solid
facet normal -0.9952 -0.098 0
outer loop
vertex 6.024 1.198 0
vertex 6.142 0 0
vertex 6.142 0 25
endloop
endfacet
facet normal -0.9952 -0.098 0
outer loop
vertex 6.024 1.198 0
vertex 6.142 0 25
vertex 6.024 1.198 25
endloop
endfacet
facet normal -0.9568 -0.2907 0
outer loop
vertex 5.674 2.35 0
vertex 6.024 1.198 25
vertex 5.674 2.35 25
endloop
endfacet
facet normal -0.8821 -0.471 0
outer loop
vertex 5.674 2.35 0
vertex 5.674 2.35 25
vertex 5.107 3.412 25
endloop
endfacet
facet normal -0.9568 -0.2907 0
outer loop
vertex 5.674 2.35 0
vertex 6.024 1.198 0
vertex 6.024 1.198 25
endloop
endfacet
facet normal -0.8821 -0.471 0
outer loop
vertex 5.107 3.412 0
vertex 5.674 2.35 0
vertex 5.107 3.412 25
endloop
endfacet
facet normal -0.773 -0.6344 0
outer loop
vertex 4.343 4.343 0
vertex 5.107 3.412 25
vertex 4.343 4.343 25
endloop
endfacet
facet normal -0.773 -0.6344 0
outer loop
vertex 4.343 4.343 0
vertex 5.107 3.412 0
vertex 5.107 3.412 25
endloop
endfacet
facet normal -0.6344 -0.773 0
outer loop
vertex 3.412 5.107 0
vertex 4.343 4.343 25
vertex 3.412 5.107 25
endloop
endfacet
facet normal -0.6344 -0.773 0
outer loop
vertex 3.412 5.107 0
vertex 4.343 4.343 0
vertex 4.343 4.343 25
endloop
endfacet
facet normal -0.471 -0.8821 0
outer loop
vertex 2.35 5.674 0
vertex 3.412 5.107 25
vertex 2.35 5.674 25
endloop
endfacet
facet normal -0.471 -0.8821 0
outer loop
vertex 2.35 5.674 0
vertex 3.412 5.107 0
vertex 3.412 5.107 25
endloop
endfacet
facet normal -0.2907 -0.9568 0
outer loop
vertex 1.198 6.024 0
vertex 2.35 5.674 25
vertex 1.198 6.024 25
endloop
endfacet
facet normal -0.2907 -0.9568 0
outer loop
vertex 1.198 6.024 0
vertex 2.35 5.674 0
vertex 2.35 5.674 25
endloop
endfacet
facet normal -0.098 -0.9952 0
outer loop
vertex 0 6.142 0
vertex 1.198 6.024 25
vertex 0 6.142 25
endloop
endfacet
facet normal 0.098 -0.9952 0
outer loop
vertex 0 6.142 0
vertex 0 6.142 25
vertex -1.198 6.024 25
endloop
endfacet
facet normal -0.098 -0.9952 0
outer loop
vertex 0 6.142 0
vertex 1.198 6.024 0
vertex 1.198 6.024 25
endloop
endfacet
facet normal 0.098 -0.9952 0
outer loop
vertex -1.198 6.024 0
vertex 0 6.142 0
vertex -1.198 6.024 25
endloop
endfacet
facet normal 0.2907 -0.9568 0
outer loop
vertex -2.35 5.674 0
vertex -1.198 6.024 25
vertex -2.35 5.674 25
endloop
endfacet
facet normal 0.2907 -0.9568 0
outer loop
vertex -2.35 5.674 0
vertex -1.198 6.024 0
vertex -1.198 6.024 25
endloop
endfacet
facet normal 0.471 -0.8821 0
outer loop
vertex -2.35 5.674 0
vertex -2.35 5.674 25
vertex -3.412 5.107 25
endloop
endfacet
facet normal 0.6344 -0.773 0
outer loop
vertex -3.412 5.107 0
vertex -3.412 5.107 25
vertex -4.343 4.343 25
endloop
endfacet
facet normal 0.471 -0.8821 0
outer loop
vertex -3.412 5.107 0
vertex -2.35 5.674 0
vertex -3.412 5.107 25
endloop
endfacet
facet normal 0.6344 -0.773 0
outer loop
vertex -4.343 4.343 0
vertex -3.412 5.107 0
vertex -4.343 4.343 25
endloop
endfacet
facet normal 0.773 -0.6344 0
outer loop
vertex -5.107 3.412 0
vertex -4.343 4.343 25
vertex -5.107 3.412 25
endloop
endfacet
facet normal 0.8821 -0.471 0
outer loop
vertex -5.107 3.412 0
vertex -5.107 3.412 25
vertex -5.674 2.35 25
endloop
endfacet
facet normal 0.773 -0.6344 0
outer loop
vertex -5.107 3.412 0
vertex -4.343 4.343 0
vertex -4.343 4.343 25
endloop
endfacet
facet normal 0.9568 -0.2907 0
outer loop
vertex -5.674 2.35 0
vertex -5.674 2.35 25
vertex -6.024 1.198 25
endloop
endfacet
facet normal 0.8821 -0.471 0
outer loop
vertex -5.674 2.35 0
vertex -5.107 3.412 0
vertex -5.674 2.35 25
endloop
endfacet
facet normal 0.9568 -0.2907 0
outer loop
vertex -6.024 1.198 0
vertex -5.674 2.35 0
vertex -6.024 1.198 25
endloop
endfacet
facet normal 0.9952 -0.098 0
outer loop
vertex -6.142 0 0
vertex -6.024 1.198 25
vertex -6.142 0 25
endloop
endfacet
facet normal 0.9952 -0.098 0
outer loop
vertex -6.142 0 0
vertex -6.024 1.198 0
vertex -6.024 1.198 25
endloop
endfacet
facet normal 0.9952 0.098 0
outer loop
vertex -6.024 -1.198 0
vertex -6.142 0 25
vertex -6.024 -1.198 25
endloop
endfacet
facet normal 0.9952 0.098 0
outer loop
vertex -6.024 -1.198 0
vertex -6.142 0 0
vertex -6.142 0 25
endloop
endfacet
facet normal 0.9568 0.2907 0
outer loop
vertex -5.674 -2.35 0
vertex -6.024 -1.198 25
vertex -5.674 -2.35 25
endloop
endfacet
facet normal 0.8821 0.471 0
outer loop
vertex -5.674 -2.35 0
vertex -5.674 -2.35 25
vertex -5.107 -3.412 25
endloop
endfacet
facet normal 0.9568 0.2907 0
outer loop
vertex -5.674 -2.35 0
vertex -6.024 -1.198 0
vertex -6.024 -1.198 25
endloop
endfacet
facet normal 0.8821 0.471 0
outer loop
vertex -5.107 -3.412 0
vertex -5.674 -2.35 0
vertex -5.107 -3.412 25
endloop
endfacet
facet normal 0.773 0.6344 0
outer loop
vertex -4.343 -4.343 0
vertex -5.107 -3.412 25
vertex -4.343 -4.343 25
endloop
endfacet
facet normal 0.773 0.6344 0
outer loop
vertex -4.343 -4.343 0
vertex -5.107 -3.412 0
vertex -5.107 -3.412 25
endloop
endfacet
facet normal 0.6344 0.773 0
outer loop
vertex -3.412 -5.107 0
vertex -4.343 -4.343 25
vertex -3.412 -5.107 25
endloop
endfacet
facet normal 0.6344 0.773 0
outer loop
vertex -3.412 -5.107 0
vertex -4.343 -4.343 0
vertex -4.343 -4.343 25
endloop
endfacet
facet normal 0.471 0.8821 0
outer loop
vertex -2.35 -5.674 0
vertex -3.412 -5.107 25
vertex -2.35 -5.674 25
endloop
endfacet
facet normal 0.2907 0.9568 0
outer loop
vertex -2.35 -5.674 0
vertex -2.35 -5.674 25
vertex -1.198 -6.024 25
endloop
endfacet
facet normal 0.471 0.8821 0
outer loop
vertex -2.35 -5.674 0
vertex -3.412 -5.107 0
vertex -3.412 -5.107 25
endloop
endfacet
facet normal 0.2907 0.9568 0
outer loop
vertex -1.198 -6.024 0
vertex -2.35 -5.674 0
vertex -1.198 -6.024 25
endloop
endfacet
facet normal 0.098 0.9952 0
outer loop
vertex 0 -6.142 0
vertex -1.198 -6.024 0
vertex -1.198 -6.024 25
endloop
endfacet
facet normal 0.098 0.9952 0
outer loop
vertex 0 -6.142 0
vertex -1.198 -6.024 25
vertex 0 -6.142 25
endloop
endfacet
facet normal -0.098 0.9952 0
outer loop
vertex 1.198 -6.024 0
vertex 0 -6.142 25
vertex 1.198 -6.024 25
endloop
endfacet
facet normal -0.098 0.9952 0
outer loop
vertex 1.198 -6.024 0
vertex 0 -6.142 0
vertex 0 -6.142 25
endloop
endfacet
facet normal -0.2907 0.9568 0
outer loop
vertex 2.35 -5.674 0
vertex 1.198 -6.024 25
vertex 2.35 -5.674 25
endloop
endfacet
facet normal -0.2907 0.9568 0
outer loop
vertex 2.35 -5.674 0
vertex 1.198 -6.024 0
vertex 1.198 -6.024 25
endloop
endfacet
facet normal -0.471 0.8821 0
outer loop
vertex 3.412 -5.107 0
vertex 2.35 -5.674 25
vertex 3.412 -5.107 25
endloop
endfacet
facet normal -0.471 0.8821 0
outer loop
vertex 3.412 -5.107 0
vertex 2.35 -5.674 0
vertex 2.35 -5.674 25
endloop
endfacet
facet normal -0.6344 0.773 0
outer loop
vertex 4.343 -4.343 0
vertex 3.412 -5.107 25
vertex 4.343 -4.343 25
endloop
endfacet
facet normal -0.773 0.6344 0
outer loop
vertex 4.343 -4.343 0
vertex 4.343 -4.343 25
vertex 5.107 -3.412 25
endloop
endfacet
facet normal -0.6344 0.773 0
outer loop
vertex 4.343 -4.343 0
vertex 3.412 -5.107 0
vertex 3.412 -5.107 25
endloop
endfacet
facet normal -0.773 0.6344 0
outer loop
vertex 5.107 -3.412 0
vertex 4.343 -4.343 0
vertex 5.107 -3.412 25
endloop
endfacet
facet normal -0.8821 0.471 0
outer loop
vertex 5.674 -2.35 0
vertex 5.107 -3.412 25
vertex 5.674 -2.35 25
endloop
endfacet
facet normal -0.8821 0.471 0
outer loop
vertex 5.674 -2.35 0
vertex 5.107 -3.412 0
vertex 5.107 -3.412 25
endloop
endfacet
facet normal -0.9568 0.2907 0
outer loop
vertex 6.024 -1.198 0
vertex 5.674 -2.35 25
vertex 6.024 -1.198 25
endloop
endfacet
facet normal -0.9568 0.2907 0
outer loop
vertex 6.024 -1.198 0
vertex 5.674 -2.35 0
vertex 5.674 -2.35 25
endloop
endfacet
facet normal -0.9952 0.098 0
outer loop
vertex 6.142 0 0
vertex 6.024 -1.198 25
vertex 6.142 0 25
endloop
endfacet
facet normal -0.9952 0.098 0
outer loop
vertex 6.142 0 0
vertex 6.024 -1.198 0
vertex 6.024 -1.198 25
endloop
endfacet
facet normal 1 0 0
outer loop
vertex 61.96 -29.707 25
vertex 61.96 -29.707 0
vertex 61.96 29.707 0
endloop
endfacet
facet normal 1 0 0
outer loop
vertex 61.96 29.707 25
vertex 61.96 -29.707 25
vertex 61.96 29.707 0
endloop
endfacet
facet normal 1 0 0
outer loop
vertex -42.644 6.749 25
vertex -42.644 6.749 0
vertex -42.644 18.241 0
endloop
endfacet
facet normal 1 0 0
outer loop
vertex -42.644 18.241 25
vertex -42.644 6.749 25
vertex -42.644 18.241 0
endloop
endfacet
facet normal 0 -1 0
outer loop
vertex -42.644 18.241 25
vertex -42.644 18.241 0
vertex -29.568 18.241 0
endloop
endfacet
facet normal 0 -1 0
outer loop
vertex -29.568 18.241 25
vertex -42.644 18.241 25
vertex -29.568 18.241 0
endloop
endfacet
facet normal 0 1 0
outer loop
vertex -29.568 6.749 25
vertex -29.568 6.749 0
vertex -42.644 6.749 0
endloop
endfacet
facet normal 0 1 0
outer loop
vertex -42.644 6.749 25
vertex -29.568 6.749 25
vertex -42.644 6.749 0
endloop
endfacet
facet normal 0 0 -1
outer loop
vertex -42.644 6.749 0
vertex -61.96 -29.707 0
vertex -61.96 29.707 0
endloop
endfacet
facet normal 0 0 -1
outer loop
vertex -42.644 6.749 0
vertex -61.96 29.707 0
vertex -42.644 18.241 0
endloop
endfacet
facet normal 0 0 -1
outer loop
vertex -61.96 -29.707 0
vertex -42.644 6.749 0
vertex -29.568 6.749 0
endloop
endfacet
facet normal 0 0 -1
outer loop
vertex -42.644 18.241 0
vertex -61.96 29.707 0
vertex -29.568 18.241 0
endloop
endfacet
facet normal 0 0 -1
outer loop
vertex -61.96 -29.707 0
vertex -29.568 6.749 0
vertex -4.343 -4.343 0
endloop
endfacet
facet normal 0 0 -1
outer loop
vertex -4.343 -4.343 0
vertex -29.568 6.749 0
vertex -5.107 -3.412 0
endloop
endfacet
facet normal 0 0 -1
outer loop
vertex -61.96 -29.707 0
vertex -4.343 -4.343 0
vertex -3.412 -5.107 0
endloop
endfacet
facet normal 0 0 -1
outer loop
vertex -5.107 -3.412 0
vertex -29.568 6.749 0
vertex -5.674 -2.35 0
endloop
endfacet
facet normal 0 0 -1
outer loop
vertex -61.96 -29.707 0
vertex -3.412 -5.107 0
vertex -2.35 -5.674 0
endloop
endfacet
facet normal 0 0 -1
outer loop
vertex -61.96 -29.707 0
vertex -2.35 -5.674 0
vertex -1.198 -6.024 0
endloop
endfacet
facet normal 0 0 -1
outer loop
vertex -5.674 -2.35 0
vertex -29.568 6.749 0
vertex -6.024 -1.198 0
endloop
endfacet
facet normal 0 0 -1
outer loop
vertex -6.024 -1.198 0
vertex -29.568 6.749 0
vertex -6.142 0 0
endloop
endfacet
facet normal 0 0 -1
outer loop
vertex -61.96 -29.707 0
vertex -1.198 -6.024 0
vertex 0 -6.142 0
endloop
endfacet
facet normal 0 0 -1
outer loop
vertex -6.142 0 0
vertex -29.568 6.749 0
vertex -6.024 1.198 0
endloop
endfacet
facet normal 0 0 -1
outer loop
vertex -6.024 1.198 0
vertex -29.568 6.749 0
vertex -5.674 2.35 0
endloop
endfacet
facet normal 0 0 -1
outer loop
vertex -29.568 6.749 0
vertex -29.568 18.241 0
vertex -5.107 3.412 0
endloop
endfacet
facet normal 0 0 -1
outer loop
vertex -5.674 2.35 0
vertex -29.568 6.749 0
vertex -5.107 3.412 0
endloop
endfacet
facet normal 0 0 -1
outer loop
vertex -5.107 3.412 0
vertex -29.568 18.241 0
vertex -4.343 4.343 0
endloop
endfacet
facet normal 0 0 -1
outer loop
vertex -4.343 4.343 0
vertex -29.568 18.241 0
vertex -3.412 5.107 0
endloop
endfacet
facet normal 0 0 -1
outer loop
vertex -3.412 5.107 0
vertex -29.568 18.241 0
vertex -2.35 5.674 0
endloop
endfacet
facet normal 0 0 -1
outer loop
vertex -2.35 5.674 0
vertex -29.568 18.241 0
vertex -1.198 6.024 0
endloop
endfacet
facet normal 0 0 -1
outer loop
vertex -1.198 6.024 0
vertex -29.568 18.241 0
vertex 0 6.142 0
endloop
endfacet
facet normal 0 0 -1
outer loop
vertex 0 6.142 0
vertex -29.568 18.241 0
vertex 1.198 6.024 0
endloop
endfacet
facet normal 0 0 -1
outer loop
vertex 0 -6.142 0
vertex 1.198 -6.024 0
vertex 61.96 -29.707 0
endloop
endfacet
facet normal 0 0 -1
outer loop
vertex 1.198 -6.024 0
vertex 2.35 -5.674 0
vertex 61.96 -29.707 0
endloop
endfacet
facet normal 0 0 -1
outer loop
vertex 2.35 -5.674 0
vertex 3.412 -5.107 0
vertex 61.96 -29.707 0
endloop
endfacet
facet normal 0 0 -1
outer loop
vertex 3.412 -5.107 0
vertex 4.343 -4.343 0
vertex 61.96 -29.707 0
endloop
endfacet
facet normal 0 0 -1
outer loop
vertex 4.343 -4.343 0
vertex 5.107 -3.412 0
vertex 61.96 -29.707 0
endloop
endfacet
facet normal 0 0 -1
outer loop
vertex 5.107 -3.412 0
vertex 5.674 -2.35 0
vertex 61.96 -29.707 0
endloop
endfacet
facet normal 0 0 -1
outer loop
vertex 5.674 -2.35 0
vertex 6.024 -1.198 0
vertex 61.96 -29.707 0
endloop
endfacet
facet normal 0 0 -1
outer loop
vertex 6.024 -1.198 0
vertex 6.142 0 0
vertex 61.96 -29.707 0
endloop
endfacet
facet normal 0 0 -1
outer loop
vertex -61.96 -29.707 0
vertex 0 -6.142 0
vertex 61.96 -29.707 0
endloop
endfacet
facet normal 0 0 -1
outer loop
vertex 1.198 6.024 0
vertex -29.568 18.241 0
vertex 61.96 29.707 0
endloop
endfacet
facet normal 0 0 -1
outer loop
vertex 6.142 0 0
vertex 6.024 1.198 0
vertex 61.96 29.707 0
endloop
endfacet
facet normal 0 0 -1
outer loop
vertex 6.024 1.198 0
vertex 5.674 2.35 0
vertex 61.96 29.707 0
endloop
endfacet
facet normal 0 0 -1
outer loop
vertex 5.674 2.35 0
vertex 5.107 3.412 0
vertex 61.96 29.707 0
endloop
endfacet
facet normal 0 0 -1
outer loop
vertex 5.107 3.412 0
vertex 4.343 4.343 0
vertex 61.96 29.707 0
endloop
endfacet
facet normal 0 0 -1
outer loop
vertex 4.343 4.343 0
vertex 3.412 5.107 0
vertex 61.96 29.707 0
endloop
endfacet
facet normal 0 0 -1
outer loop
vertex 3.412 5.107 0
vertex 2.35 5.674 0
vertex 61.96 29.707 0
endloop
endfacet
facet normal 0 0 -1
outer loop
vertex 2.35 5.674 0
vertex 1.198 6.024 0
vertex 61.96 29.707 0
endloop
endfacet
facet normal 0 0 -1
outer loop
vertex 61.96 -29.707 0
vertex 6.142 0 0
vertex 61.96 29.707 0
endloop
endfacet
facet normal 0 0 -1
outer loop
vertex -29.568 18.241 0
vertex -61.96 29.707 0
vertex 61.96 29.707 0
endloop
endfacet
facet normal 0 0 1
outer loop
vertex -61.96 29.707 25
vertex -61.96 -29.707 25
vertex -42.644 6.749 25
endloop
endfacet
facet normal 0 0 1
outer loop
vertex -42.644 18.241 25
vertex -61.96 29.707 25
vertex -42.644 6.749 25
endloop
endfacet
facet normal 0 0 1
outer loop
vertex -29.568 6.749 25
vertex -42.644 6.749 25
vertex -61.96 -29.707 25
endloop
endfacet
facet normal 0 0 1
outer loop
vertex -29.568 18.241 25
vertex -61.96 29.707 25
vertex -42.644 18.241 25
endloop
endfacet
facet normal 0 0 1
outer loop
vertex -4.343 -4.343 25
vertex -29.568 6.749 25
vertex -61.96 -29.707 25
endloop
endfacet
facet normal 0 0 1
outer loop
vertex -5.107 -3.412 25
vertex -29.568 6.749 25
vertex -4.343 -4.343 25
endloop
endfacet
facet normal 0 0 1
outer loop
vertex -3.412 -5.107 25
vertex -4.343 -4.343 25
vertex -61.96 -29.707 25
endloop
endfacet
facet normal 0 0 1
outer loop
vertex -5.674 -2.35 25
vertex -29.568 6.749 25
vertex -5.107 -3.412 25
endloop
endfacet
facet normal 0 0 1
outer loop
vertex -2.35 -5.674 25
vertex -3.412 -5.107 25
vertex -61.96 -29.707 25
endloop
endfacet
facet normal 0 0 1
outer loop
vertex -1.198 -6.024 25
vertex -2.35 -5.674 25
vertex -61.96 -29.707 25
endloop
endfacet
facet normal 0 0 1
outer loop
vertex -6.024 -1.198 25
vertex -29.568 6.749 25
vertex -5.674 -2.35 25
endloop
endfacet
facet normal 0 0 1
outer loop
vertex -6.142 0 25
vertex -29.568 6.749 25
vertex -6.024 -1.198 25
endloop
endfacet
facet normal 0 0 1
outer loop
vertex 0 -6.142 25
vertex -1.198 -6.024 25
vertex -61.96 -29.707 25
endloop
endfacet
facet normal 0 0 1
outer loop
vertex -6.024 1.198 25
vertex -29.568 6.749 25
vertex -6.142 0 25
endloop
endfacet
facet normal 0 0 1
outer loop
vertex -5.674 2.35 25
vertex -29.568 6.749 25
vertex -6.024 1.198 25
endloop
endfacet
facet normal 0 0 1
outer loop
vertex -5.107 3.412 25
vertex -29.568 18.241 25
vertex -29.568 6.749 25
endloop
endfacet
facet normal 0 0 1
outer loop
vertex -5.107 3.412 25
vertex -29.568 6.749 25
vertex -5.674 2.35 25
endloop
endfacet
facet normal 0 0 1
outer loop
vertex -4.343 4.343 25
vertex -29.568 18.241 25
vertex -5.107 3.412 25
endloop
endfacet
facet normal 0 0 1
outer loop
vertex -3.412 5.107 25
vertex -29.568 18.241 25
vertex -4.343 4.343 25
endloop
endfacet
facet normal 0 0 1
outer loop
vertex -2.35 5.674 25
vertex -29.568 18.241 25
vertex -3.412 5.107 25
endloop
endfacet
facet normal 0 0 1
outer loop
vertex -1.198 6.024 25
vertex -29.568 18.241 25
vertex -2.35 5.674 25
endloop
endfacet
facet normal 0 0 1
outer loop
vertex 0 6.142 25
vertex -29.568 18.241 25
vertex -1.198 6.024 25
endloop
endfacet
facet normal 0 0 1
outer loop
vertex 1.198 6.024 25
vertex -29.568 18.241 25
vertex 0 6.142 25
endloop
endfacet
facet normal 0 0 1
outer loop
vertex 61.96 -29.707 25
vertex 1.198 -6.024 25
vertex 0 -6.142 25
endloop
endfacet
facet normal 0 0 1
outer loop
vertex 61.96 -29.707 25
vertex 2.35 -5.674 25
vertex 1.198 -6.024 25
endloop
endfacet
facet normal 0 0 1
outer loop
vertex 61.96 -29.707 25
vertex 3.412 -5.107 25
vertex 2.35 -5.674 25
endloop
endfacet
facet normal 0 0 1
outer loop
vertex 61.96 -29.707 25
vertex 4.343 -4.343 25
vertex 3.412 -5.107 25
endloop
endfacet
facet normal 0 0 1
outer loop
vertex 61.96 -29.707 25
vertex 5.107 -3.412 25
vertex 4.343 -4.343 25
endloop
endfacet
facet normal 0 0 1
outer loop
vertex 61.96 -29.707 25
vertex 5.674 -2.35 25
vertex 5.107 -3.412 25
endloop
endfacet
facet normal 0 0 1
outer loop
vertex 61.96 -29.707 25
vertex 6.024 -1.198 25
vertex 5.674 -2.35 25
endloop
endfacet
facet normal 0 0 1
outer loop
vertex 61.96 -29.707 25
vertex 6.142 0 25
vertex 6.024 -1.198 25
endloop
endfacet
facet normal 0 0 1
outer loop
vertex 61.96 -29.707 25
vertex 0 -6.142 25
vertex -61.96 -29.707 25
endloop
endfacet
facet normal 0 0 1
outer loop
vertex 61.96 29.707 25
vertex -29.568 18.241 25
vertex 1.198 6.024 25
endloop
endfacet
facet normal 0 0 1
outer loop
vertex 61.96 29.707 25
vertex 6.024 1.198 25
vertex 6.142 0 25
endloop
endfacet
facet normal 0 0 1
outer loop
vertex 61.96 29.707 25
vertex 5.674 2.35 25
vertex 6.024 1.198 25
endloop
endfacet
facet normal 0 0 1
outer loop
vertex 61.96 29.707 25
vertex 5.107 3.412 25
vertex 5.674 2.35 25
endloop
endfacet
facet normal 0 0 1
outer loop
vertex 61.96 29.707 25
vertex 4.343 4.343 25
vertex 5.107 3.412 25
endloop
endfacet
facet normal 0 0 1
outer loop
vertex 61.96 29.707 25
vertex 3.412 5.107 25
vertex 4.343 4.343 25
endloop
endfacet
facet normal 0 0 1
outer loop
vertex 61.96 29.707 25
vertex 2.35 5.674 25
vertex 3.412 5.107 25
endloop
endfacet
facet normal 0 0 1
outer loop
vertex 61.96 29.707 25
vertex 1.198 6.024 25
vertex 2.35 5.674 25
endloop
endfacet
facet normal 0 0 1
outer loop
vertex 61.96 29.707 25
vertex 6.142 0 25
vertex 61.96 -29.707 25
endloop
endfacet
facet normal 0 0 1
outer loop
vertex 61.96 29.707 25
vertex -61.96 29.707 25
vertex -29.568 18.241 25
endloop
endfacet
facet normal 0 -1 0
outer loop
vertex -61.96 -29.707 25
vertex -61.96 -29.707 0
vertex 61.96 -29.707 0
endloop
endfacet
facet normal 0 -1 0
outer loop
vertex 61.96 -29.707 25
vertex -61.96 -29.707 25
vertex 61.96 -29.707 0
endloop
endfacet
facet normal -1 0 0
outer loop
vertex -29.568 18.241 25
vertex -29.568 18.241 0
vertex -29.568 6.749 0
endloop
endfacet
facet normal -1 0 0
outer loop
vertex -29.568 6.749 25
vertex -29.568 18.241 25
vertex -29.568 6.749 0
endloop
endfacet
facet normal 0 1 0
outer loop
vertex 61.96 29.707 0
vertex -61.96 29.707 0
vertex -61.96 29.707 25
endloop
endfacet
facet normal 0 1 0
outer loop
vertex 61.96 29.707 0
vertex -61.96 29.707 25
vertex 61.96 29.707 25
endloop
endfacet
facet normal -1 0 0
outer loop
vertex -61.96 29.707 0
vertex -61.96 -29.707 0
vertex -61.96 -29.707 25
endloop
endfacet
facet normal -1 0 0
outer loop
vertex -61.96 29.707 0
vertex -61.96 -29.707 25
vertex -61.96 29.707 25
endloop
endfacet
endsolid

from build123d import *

# Parameters (mm, degrees)
F0_W     = 123.919994
F0_H     = 59.413508
F0_R     = 6.14177
F1_DEPTH = 25


with BuildPart() as f1:
    # F0 (on Top) → F1 (new body)
    with BuildSketch(Plane.XY):
        Rectangle(F0_W, F0_H)
        Polygon((-42.643782, 6.749166), (-42.643782, 18.240707), (-29.568307, 18.240707), (-29.568307, 12.494937), (-29.568307, 6.749166), align=None, mode=Mode.SUBTRACT)
        Circle(F0_R, mode=Mode.SUBTRACT)
    extrude(amount=F1_DEPTH)


solid = f1.part
